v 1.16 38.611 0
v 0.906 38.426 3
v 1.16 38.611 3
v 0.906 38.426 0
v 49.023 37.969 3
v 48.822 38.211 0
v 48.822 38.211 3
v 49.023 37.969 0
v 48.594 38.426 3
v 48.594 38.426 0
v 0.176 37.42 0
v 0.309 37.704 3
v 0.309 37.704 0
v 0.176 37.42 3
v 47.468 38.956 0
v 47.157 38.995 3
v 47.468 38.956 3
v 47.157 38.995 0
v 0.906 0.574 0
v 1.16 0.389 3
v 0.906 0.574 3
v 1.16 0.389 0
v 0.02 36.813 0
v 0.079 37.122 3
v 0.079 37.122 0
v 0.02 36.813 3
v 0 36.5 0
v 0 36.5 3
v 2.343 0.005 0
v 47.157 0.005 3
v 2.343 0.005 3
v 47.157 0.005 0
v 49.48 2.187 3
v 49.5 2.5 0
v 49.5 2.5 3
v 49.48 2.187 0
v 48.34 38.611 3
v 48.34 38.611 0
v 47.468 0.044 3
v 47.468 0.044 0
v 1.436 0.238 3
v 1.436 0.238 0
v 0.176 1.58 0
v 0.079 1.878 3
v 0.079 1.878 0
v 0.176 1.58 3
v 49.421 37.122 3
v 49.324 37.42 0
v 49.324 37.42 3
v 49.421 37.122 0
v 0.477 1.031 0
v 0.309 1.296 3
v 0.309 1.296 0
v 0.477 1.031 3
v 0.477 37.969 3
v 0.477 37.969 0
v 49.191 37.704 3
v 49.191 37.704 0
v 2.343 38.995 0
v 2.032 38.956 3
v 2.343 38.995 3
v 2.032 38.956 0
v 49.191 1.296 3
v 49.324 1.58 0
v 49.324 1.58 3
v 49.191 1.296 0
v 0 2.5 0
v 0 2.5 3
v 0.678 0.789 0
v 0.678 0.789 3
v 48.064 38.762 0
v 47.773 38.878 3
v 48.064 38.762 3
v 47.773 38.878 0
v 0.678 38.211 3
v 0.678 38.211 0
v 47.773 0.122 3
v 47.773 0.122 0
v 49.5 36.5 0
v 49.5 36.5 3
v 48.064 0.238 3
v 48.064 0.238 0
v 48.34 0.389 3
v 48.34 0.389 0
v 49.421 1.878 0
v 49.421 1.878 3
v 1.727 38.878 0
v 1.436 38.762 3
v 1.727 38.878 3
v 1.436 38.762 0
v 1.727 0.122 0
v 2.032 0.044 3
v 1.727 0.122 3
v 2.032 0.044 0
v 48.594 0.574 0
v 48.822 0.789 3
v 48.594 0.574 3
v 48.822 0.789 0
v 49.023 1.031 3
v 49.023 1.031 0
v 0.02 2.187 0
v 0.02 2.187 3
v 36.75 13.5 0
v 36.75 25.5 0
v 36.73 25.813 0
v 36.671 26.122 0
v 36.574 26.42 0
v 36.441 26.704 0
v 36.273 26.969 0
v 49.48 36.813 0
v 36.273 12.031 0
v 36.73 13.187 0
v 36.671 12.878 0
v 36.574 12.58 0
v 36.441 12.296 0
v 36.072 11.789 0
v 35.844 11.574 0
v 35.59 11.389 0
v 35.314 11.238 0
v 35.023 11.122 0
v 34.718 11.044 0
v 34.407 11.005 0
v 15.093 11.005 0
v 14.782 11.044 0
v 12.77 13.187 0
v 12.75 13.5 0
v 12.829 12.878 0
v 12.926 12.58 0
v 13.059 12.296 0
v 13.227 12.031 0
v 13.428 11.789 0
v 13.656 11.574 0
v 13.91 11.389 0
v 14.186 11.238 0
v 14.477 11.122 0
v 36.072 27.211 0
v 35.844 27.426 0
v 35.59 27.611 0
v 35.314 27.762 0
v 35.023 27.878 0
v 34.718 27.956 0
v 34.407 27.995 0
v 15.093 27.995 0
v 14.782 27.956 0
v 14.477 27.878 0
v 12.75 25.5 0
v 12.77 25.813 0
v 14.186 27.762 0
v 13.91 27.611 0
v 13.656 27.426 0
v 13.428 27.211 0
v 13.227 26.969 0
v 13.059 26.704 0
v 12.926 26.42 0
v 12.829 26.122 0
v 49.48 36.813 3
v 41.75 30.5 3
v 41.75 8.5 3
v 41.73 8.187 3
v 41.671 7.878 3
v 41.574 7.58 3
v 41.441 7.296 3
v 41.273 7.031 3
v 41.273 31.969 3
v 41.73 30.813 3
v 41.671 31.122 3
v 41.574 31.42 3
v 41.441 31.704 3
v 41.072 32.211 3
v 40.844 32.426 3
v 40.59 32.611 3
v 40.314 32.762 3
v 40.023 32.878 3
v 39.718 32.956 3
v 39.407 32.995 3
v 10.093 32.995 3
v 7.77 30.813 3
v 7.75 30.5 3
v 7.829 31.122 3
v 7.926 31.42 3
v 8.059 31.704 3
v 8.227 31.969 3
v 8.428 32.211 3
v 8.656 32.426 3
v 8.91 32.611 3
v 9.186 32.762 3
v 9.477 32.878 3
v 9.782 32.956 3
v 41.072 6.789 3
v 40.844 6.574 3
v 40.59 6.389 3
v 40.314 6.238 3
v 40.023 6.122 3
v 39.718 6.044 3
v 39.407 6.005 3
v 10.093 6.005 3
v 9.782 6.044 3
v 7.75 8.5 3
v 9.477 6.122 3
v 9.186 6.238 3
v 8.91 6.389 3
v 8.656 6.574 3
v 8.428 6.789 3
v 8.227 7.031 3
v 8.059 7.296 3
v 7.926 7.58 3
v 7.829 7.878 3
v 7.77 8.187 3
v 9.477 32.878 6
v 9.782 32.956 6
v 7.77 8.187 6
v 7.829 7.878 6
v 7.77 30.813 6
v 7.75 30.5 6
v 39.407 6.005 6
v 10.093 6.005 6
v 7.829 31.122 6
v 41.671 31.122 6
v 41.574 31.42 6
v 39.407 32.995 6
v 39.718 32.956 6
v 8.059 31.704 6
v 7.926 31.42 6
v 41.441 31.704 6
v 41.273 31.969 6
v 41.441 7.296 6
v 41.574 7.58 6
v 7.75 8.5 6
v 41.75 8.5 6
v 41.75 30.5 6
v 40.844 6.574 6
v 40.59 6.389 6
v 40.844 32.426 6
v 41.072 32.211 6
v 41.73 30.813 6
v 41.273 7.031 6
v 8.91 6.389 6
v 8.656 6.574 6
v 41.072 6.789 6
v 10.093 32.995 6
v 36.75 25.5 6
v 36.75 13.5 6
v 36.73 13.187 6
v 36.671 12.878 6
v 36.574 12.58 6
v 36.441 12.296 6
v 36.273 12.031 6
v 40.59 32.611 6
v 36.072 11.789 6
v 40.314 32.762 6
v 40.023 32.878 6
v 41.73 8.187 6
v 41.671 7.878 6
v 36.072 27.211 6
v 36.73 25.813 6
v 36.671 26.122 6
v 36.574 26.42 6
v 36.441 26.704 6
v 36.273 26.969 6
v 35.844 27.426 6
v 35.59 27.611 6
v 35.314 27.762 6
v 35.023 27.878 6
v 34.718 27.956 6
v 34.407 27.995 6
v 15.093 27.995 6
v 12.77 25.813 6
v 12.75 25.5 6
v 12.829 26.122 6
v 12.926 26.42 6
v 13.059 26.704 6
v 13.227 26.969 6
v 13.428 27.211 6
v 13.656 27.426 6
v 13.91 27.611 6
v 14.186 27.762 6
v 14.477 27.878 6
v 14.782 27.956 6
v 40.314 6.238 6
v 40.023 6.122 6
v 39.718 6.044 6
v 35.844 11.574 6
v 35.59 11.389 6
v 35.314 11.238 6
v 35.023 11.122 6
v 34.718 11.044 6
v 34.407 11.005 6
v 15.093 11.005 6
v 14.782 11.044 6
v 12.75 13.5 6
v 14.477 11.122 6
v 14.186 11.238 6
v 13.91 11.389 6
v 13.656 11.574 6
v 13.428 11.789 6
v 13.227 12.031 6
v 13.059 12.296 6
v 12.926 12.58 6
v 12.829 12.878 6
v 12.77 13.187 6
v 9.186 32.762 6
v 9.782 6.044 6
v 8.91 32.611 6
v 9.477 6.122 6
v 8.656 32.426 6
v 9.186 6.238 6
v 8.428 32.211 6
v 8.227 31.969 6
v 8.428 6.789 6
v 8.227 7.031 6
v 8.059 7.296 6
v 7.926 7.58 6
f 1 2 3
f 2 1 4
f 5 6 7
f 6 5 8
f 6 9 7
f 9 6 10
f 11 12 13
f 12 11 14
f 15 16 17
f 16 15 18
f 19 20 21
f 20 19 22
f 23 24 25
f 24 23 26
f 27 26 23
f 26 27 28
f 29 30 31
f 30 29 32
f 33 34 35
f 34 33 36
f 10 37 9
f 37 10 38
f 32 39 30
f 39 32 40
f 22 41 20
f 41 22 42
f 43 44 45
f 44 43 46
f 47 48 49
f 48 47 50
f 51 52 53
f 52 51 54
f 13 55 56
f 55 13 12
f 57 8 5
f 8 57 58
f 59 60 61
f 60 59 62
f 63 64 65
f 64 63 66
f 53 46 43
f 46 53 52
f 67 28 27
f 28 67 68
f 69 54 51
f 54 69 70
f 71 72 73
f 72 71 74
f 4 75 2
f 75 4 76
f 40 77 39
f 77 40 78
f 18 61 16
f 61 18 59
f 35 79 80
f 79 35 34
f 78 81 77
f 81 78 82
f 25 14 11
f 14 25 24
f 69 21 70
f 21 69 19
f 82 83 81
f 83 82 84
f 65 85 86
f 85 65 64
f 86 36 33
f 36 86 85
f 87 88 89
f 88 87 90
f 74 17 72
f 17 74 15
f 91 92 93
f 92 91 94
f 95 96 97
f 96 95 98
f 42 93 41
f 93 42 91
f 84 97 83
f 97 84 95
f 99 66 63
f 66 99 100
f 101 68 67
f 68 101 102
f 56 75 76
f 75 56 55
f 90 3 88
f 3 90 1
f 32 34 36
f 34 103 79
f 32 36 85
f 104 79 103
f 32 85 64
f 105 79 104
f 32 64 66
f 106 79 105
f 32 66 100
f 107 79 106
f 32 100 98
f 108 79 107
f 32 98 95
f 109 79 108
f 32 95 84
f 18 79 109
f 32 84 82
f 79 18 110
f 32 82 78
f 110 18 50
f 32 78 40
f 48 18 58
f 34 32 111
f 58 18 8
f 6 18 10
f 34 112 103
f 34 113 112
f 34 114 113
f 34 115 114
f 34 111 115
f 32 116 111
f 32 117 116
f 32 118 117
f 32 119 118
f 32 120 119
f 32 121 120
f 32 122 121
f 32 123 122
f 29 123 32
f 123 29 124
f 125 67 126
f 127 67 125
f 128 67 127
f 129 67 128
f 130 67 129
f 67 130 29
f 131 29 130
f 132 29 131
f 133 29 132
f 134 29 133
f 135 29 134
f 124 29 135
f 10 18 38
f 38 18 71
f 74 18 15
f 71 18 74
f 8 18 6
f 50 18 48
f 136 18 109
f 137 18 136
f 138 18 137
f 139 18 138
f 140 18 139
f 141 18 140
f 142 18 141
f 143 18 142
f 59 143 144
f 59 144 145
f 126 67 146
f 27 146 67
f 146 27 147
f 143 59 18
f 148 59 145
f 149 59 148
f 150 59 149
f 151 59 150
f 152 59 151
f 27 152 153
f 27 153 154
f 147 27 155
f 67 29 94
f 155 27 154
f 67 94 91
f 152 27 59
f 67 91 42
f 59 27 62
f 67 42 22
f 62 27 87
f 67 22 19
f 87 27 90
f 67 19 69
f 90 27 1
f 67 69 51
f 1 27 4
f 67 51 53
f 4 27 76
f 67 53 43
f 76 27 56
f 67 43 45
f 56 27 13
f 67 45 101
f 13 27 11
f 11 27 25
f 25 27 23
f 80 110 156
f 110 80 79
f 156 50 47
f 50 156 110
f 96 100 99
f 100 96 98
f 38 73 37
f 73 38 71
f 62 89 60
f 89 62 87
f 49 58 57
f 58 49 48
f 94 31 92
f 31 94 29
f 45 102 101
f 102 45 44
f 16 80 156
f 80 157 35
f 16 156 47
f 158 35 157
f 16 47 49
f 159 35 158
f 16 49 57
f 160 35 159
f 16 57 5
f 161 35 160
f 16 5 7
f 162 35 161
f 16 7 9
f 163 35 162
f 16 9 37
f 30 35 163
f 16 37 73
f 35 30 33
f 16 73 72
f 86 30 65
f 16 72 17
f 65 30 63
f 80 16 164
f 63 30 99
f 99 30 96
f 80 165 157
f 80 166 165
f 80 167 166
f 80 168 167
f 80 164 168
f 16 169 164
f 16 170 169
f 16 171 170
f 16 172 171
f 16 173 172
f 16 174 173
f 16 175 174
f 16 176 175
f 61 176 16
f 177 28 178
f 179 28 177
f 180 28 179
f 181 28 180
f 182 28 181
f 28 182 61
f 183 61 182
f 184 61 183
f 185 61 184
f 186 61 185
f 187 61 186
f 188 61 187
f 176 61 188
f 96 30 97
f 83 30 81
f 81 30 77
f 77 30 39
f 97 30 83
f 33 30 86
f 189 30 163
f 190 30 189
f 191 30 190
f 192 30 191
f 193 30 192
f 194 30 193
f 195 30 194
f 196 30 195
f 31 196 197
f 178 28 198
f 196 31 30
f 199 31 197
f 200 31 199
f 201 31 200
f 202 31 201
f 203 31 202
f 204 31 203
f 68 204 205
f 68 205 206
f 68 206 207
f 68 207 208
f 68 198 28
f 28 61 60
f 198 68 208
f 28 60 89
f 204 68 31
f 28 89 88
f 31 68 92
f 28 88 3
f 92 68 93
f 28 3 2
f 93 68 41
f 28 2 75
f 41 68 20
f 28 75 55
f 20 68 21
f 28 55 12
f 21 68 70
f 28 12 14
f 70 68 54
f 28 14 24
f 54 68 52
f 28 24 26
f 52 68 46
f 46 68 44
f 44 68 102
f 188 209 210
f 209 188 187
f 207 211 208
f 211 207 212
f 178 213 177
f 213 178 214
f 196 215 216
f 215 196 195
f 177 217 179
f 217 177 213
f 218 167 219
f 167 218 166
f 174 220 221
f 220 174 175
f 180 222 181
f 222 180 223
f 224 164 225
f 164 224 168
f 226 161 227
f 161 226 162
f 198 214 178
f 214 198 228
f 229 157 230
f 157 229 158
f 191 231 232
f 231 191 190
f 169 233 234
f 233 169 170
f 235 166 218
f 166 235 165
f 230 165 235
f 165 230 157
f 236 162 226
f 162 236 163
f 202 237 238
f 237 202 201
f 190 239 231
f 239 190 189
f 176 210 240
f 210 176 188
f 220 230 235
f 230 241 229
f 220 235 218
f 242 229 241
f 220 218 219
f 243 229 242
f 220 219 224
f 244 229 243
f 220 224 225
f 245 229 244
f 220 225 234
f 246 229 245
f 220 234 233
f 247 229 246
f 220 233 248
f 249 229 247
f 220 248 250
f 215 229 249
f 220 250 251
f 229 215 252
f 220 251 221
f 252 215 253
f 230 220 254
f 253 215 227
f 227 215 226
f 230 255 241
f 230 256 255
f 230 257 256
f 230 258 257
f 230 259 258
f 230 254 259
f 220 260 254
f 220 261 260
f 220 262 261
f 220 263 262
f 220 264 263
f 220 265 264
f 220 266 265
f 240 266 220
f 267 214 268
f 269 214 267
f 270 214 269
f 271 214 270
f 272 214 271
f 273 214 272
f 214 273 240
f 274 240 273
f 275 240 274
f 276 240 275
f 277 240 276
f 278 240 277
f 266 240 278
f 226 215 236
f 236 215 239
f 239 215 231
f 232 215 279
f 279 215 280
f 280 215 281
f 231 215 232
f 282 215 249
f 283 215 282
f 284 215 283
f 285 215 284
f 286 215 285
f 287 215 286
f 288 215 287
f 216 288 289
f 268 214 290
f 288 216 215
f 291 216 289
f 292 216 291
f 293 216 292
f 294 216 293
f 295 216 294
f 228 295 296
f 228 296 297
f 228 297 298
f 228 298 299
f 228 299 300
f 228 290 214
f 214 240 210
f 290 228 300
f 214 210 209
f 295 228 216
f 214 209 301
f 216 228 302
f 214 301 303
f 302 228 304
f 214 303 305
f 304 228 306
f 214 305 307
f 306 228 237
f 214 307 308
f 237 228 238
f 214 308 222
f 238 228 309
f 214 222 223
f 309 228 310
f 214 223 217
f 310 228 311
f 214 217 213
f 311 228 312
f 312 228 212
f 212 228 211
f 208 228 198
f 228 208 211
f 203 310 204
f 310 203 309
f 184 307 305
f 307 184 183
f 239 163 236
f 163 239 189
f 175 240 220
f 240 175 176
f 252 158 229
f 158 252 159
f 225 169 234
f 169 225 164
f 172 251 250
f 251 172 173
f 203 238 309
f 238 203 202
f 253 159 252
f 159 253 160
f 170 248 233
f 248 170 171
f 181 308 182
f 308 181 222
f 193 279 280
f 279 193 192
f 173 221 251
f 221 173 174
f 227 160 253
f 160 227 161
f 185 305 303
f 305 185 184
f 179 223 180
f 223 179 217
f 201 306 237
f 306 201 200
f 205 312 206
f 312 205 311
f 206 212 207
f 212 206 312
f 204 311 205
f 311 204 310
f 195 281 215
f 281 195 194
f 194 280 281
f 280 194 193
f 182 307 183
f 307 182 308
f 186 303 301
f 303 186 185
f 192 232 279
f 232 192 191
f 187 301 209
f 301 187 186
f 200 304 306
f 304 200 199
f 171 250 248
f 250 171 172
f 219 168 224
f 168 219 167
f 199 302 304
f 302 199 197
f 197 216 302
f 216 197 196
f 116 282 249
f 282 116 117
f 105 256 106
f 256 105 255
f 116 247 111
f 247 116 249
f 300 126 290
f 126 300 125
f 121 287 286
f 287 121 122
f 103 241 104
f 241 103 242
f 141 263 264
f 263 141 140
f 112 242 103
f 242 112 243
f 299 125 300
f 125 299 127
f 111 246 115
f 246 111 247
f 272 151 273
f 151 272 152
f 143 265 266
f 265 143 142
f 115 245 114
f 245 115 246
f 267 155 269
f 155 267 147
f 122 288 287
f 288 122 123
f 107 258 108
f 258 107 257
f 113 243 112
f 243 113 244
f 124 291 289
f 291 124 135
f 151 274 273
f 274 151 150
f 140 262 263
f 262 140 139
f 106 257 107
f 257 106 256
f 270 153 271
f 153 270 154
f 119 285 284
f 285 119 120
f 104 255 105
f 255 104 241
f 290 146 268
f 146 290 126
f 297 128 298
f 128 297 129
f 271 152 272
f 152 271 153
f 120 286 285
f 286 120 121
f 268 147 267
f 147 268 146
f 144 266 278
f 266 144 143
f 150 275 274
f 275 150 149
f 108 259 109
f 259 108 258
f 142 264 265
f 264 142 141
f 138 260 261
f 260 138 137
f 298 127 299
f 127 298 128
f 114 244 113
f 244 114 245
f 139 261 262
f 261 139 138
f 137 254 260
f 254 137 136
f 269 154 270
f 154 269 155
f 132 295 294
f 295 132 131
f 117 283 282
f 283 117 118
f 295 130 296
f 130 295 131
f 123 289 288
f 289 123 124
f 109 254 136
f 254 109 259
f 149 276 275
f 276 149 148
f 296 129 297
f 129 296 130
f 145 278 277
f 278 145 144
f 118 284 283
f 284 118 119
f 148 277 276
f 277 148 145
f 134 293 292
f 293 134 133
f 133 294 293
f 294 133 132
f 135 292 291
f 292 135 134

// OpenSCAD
//x = 31.5; //mm
//y = 41.5; //mm

$fn =50;

//d1 = y + 15;
//cylinder(d=d1, h= 5);


//module m1(x,y,z) {
//    minkowski(){
//        cube([x,y,z], center=true);
//        sphere(d=z);
//    }
//}


//difference(){
//hull(){
//    m1(x+10,y+10,5);
//    translate([0,0,15]) m1(x+5,y+5,5);
//}
//
//translate([0,0,15]) cube([x,y,20], center=true);
//}

//translate([0,0,-5]) cube([5,5,25]);


// v2 
//
//x= 34;
//y= 27;
//
//x1 = 34+5;
//y1 = 27+5;
//
//difference(){
//union(){
//m1(x1,y1,3);
//
//translate([0,0,4]) m1(x-3,y-3,3); 
////cube([x,y,10], center=true);
//}
//
//translate([0,0,-1]) m1(x-25,y-25,15);  // cylinder(d=x-15, h=20);
//}


// outer dim
x0 = 41.5;
y0 = 31;

// inner dim
x1 = 34;
y1= 27;


//base dim
x = x0+8;
y = y0+8;

// hole dim 

x2 = x1-10;
y2 = y1-10;

difference(){

union(){
//%cube([x,y,5]);
m1(x,y,3);


translate([(x-x1)/2,(y-y1)/2,0]) m1(x1,y1,6);
}


translate([(x-x2)/2,(y-y2)/2,0])  m1(x2,y2,6);

}

module m1(x,y,z) {
d = 5;

hull(){
translate([d/2,d/2,0]) cylinder(d=d,h=z);
translate([d/2,y-d/2,0]) cylinder(d=d,h=z);

translate([x-d/2,d/2,0]) cylinder(d=d,h=z);
translate([x-d/2,y-d/2,0]) cylinder(d=d,h=z);
}
}
